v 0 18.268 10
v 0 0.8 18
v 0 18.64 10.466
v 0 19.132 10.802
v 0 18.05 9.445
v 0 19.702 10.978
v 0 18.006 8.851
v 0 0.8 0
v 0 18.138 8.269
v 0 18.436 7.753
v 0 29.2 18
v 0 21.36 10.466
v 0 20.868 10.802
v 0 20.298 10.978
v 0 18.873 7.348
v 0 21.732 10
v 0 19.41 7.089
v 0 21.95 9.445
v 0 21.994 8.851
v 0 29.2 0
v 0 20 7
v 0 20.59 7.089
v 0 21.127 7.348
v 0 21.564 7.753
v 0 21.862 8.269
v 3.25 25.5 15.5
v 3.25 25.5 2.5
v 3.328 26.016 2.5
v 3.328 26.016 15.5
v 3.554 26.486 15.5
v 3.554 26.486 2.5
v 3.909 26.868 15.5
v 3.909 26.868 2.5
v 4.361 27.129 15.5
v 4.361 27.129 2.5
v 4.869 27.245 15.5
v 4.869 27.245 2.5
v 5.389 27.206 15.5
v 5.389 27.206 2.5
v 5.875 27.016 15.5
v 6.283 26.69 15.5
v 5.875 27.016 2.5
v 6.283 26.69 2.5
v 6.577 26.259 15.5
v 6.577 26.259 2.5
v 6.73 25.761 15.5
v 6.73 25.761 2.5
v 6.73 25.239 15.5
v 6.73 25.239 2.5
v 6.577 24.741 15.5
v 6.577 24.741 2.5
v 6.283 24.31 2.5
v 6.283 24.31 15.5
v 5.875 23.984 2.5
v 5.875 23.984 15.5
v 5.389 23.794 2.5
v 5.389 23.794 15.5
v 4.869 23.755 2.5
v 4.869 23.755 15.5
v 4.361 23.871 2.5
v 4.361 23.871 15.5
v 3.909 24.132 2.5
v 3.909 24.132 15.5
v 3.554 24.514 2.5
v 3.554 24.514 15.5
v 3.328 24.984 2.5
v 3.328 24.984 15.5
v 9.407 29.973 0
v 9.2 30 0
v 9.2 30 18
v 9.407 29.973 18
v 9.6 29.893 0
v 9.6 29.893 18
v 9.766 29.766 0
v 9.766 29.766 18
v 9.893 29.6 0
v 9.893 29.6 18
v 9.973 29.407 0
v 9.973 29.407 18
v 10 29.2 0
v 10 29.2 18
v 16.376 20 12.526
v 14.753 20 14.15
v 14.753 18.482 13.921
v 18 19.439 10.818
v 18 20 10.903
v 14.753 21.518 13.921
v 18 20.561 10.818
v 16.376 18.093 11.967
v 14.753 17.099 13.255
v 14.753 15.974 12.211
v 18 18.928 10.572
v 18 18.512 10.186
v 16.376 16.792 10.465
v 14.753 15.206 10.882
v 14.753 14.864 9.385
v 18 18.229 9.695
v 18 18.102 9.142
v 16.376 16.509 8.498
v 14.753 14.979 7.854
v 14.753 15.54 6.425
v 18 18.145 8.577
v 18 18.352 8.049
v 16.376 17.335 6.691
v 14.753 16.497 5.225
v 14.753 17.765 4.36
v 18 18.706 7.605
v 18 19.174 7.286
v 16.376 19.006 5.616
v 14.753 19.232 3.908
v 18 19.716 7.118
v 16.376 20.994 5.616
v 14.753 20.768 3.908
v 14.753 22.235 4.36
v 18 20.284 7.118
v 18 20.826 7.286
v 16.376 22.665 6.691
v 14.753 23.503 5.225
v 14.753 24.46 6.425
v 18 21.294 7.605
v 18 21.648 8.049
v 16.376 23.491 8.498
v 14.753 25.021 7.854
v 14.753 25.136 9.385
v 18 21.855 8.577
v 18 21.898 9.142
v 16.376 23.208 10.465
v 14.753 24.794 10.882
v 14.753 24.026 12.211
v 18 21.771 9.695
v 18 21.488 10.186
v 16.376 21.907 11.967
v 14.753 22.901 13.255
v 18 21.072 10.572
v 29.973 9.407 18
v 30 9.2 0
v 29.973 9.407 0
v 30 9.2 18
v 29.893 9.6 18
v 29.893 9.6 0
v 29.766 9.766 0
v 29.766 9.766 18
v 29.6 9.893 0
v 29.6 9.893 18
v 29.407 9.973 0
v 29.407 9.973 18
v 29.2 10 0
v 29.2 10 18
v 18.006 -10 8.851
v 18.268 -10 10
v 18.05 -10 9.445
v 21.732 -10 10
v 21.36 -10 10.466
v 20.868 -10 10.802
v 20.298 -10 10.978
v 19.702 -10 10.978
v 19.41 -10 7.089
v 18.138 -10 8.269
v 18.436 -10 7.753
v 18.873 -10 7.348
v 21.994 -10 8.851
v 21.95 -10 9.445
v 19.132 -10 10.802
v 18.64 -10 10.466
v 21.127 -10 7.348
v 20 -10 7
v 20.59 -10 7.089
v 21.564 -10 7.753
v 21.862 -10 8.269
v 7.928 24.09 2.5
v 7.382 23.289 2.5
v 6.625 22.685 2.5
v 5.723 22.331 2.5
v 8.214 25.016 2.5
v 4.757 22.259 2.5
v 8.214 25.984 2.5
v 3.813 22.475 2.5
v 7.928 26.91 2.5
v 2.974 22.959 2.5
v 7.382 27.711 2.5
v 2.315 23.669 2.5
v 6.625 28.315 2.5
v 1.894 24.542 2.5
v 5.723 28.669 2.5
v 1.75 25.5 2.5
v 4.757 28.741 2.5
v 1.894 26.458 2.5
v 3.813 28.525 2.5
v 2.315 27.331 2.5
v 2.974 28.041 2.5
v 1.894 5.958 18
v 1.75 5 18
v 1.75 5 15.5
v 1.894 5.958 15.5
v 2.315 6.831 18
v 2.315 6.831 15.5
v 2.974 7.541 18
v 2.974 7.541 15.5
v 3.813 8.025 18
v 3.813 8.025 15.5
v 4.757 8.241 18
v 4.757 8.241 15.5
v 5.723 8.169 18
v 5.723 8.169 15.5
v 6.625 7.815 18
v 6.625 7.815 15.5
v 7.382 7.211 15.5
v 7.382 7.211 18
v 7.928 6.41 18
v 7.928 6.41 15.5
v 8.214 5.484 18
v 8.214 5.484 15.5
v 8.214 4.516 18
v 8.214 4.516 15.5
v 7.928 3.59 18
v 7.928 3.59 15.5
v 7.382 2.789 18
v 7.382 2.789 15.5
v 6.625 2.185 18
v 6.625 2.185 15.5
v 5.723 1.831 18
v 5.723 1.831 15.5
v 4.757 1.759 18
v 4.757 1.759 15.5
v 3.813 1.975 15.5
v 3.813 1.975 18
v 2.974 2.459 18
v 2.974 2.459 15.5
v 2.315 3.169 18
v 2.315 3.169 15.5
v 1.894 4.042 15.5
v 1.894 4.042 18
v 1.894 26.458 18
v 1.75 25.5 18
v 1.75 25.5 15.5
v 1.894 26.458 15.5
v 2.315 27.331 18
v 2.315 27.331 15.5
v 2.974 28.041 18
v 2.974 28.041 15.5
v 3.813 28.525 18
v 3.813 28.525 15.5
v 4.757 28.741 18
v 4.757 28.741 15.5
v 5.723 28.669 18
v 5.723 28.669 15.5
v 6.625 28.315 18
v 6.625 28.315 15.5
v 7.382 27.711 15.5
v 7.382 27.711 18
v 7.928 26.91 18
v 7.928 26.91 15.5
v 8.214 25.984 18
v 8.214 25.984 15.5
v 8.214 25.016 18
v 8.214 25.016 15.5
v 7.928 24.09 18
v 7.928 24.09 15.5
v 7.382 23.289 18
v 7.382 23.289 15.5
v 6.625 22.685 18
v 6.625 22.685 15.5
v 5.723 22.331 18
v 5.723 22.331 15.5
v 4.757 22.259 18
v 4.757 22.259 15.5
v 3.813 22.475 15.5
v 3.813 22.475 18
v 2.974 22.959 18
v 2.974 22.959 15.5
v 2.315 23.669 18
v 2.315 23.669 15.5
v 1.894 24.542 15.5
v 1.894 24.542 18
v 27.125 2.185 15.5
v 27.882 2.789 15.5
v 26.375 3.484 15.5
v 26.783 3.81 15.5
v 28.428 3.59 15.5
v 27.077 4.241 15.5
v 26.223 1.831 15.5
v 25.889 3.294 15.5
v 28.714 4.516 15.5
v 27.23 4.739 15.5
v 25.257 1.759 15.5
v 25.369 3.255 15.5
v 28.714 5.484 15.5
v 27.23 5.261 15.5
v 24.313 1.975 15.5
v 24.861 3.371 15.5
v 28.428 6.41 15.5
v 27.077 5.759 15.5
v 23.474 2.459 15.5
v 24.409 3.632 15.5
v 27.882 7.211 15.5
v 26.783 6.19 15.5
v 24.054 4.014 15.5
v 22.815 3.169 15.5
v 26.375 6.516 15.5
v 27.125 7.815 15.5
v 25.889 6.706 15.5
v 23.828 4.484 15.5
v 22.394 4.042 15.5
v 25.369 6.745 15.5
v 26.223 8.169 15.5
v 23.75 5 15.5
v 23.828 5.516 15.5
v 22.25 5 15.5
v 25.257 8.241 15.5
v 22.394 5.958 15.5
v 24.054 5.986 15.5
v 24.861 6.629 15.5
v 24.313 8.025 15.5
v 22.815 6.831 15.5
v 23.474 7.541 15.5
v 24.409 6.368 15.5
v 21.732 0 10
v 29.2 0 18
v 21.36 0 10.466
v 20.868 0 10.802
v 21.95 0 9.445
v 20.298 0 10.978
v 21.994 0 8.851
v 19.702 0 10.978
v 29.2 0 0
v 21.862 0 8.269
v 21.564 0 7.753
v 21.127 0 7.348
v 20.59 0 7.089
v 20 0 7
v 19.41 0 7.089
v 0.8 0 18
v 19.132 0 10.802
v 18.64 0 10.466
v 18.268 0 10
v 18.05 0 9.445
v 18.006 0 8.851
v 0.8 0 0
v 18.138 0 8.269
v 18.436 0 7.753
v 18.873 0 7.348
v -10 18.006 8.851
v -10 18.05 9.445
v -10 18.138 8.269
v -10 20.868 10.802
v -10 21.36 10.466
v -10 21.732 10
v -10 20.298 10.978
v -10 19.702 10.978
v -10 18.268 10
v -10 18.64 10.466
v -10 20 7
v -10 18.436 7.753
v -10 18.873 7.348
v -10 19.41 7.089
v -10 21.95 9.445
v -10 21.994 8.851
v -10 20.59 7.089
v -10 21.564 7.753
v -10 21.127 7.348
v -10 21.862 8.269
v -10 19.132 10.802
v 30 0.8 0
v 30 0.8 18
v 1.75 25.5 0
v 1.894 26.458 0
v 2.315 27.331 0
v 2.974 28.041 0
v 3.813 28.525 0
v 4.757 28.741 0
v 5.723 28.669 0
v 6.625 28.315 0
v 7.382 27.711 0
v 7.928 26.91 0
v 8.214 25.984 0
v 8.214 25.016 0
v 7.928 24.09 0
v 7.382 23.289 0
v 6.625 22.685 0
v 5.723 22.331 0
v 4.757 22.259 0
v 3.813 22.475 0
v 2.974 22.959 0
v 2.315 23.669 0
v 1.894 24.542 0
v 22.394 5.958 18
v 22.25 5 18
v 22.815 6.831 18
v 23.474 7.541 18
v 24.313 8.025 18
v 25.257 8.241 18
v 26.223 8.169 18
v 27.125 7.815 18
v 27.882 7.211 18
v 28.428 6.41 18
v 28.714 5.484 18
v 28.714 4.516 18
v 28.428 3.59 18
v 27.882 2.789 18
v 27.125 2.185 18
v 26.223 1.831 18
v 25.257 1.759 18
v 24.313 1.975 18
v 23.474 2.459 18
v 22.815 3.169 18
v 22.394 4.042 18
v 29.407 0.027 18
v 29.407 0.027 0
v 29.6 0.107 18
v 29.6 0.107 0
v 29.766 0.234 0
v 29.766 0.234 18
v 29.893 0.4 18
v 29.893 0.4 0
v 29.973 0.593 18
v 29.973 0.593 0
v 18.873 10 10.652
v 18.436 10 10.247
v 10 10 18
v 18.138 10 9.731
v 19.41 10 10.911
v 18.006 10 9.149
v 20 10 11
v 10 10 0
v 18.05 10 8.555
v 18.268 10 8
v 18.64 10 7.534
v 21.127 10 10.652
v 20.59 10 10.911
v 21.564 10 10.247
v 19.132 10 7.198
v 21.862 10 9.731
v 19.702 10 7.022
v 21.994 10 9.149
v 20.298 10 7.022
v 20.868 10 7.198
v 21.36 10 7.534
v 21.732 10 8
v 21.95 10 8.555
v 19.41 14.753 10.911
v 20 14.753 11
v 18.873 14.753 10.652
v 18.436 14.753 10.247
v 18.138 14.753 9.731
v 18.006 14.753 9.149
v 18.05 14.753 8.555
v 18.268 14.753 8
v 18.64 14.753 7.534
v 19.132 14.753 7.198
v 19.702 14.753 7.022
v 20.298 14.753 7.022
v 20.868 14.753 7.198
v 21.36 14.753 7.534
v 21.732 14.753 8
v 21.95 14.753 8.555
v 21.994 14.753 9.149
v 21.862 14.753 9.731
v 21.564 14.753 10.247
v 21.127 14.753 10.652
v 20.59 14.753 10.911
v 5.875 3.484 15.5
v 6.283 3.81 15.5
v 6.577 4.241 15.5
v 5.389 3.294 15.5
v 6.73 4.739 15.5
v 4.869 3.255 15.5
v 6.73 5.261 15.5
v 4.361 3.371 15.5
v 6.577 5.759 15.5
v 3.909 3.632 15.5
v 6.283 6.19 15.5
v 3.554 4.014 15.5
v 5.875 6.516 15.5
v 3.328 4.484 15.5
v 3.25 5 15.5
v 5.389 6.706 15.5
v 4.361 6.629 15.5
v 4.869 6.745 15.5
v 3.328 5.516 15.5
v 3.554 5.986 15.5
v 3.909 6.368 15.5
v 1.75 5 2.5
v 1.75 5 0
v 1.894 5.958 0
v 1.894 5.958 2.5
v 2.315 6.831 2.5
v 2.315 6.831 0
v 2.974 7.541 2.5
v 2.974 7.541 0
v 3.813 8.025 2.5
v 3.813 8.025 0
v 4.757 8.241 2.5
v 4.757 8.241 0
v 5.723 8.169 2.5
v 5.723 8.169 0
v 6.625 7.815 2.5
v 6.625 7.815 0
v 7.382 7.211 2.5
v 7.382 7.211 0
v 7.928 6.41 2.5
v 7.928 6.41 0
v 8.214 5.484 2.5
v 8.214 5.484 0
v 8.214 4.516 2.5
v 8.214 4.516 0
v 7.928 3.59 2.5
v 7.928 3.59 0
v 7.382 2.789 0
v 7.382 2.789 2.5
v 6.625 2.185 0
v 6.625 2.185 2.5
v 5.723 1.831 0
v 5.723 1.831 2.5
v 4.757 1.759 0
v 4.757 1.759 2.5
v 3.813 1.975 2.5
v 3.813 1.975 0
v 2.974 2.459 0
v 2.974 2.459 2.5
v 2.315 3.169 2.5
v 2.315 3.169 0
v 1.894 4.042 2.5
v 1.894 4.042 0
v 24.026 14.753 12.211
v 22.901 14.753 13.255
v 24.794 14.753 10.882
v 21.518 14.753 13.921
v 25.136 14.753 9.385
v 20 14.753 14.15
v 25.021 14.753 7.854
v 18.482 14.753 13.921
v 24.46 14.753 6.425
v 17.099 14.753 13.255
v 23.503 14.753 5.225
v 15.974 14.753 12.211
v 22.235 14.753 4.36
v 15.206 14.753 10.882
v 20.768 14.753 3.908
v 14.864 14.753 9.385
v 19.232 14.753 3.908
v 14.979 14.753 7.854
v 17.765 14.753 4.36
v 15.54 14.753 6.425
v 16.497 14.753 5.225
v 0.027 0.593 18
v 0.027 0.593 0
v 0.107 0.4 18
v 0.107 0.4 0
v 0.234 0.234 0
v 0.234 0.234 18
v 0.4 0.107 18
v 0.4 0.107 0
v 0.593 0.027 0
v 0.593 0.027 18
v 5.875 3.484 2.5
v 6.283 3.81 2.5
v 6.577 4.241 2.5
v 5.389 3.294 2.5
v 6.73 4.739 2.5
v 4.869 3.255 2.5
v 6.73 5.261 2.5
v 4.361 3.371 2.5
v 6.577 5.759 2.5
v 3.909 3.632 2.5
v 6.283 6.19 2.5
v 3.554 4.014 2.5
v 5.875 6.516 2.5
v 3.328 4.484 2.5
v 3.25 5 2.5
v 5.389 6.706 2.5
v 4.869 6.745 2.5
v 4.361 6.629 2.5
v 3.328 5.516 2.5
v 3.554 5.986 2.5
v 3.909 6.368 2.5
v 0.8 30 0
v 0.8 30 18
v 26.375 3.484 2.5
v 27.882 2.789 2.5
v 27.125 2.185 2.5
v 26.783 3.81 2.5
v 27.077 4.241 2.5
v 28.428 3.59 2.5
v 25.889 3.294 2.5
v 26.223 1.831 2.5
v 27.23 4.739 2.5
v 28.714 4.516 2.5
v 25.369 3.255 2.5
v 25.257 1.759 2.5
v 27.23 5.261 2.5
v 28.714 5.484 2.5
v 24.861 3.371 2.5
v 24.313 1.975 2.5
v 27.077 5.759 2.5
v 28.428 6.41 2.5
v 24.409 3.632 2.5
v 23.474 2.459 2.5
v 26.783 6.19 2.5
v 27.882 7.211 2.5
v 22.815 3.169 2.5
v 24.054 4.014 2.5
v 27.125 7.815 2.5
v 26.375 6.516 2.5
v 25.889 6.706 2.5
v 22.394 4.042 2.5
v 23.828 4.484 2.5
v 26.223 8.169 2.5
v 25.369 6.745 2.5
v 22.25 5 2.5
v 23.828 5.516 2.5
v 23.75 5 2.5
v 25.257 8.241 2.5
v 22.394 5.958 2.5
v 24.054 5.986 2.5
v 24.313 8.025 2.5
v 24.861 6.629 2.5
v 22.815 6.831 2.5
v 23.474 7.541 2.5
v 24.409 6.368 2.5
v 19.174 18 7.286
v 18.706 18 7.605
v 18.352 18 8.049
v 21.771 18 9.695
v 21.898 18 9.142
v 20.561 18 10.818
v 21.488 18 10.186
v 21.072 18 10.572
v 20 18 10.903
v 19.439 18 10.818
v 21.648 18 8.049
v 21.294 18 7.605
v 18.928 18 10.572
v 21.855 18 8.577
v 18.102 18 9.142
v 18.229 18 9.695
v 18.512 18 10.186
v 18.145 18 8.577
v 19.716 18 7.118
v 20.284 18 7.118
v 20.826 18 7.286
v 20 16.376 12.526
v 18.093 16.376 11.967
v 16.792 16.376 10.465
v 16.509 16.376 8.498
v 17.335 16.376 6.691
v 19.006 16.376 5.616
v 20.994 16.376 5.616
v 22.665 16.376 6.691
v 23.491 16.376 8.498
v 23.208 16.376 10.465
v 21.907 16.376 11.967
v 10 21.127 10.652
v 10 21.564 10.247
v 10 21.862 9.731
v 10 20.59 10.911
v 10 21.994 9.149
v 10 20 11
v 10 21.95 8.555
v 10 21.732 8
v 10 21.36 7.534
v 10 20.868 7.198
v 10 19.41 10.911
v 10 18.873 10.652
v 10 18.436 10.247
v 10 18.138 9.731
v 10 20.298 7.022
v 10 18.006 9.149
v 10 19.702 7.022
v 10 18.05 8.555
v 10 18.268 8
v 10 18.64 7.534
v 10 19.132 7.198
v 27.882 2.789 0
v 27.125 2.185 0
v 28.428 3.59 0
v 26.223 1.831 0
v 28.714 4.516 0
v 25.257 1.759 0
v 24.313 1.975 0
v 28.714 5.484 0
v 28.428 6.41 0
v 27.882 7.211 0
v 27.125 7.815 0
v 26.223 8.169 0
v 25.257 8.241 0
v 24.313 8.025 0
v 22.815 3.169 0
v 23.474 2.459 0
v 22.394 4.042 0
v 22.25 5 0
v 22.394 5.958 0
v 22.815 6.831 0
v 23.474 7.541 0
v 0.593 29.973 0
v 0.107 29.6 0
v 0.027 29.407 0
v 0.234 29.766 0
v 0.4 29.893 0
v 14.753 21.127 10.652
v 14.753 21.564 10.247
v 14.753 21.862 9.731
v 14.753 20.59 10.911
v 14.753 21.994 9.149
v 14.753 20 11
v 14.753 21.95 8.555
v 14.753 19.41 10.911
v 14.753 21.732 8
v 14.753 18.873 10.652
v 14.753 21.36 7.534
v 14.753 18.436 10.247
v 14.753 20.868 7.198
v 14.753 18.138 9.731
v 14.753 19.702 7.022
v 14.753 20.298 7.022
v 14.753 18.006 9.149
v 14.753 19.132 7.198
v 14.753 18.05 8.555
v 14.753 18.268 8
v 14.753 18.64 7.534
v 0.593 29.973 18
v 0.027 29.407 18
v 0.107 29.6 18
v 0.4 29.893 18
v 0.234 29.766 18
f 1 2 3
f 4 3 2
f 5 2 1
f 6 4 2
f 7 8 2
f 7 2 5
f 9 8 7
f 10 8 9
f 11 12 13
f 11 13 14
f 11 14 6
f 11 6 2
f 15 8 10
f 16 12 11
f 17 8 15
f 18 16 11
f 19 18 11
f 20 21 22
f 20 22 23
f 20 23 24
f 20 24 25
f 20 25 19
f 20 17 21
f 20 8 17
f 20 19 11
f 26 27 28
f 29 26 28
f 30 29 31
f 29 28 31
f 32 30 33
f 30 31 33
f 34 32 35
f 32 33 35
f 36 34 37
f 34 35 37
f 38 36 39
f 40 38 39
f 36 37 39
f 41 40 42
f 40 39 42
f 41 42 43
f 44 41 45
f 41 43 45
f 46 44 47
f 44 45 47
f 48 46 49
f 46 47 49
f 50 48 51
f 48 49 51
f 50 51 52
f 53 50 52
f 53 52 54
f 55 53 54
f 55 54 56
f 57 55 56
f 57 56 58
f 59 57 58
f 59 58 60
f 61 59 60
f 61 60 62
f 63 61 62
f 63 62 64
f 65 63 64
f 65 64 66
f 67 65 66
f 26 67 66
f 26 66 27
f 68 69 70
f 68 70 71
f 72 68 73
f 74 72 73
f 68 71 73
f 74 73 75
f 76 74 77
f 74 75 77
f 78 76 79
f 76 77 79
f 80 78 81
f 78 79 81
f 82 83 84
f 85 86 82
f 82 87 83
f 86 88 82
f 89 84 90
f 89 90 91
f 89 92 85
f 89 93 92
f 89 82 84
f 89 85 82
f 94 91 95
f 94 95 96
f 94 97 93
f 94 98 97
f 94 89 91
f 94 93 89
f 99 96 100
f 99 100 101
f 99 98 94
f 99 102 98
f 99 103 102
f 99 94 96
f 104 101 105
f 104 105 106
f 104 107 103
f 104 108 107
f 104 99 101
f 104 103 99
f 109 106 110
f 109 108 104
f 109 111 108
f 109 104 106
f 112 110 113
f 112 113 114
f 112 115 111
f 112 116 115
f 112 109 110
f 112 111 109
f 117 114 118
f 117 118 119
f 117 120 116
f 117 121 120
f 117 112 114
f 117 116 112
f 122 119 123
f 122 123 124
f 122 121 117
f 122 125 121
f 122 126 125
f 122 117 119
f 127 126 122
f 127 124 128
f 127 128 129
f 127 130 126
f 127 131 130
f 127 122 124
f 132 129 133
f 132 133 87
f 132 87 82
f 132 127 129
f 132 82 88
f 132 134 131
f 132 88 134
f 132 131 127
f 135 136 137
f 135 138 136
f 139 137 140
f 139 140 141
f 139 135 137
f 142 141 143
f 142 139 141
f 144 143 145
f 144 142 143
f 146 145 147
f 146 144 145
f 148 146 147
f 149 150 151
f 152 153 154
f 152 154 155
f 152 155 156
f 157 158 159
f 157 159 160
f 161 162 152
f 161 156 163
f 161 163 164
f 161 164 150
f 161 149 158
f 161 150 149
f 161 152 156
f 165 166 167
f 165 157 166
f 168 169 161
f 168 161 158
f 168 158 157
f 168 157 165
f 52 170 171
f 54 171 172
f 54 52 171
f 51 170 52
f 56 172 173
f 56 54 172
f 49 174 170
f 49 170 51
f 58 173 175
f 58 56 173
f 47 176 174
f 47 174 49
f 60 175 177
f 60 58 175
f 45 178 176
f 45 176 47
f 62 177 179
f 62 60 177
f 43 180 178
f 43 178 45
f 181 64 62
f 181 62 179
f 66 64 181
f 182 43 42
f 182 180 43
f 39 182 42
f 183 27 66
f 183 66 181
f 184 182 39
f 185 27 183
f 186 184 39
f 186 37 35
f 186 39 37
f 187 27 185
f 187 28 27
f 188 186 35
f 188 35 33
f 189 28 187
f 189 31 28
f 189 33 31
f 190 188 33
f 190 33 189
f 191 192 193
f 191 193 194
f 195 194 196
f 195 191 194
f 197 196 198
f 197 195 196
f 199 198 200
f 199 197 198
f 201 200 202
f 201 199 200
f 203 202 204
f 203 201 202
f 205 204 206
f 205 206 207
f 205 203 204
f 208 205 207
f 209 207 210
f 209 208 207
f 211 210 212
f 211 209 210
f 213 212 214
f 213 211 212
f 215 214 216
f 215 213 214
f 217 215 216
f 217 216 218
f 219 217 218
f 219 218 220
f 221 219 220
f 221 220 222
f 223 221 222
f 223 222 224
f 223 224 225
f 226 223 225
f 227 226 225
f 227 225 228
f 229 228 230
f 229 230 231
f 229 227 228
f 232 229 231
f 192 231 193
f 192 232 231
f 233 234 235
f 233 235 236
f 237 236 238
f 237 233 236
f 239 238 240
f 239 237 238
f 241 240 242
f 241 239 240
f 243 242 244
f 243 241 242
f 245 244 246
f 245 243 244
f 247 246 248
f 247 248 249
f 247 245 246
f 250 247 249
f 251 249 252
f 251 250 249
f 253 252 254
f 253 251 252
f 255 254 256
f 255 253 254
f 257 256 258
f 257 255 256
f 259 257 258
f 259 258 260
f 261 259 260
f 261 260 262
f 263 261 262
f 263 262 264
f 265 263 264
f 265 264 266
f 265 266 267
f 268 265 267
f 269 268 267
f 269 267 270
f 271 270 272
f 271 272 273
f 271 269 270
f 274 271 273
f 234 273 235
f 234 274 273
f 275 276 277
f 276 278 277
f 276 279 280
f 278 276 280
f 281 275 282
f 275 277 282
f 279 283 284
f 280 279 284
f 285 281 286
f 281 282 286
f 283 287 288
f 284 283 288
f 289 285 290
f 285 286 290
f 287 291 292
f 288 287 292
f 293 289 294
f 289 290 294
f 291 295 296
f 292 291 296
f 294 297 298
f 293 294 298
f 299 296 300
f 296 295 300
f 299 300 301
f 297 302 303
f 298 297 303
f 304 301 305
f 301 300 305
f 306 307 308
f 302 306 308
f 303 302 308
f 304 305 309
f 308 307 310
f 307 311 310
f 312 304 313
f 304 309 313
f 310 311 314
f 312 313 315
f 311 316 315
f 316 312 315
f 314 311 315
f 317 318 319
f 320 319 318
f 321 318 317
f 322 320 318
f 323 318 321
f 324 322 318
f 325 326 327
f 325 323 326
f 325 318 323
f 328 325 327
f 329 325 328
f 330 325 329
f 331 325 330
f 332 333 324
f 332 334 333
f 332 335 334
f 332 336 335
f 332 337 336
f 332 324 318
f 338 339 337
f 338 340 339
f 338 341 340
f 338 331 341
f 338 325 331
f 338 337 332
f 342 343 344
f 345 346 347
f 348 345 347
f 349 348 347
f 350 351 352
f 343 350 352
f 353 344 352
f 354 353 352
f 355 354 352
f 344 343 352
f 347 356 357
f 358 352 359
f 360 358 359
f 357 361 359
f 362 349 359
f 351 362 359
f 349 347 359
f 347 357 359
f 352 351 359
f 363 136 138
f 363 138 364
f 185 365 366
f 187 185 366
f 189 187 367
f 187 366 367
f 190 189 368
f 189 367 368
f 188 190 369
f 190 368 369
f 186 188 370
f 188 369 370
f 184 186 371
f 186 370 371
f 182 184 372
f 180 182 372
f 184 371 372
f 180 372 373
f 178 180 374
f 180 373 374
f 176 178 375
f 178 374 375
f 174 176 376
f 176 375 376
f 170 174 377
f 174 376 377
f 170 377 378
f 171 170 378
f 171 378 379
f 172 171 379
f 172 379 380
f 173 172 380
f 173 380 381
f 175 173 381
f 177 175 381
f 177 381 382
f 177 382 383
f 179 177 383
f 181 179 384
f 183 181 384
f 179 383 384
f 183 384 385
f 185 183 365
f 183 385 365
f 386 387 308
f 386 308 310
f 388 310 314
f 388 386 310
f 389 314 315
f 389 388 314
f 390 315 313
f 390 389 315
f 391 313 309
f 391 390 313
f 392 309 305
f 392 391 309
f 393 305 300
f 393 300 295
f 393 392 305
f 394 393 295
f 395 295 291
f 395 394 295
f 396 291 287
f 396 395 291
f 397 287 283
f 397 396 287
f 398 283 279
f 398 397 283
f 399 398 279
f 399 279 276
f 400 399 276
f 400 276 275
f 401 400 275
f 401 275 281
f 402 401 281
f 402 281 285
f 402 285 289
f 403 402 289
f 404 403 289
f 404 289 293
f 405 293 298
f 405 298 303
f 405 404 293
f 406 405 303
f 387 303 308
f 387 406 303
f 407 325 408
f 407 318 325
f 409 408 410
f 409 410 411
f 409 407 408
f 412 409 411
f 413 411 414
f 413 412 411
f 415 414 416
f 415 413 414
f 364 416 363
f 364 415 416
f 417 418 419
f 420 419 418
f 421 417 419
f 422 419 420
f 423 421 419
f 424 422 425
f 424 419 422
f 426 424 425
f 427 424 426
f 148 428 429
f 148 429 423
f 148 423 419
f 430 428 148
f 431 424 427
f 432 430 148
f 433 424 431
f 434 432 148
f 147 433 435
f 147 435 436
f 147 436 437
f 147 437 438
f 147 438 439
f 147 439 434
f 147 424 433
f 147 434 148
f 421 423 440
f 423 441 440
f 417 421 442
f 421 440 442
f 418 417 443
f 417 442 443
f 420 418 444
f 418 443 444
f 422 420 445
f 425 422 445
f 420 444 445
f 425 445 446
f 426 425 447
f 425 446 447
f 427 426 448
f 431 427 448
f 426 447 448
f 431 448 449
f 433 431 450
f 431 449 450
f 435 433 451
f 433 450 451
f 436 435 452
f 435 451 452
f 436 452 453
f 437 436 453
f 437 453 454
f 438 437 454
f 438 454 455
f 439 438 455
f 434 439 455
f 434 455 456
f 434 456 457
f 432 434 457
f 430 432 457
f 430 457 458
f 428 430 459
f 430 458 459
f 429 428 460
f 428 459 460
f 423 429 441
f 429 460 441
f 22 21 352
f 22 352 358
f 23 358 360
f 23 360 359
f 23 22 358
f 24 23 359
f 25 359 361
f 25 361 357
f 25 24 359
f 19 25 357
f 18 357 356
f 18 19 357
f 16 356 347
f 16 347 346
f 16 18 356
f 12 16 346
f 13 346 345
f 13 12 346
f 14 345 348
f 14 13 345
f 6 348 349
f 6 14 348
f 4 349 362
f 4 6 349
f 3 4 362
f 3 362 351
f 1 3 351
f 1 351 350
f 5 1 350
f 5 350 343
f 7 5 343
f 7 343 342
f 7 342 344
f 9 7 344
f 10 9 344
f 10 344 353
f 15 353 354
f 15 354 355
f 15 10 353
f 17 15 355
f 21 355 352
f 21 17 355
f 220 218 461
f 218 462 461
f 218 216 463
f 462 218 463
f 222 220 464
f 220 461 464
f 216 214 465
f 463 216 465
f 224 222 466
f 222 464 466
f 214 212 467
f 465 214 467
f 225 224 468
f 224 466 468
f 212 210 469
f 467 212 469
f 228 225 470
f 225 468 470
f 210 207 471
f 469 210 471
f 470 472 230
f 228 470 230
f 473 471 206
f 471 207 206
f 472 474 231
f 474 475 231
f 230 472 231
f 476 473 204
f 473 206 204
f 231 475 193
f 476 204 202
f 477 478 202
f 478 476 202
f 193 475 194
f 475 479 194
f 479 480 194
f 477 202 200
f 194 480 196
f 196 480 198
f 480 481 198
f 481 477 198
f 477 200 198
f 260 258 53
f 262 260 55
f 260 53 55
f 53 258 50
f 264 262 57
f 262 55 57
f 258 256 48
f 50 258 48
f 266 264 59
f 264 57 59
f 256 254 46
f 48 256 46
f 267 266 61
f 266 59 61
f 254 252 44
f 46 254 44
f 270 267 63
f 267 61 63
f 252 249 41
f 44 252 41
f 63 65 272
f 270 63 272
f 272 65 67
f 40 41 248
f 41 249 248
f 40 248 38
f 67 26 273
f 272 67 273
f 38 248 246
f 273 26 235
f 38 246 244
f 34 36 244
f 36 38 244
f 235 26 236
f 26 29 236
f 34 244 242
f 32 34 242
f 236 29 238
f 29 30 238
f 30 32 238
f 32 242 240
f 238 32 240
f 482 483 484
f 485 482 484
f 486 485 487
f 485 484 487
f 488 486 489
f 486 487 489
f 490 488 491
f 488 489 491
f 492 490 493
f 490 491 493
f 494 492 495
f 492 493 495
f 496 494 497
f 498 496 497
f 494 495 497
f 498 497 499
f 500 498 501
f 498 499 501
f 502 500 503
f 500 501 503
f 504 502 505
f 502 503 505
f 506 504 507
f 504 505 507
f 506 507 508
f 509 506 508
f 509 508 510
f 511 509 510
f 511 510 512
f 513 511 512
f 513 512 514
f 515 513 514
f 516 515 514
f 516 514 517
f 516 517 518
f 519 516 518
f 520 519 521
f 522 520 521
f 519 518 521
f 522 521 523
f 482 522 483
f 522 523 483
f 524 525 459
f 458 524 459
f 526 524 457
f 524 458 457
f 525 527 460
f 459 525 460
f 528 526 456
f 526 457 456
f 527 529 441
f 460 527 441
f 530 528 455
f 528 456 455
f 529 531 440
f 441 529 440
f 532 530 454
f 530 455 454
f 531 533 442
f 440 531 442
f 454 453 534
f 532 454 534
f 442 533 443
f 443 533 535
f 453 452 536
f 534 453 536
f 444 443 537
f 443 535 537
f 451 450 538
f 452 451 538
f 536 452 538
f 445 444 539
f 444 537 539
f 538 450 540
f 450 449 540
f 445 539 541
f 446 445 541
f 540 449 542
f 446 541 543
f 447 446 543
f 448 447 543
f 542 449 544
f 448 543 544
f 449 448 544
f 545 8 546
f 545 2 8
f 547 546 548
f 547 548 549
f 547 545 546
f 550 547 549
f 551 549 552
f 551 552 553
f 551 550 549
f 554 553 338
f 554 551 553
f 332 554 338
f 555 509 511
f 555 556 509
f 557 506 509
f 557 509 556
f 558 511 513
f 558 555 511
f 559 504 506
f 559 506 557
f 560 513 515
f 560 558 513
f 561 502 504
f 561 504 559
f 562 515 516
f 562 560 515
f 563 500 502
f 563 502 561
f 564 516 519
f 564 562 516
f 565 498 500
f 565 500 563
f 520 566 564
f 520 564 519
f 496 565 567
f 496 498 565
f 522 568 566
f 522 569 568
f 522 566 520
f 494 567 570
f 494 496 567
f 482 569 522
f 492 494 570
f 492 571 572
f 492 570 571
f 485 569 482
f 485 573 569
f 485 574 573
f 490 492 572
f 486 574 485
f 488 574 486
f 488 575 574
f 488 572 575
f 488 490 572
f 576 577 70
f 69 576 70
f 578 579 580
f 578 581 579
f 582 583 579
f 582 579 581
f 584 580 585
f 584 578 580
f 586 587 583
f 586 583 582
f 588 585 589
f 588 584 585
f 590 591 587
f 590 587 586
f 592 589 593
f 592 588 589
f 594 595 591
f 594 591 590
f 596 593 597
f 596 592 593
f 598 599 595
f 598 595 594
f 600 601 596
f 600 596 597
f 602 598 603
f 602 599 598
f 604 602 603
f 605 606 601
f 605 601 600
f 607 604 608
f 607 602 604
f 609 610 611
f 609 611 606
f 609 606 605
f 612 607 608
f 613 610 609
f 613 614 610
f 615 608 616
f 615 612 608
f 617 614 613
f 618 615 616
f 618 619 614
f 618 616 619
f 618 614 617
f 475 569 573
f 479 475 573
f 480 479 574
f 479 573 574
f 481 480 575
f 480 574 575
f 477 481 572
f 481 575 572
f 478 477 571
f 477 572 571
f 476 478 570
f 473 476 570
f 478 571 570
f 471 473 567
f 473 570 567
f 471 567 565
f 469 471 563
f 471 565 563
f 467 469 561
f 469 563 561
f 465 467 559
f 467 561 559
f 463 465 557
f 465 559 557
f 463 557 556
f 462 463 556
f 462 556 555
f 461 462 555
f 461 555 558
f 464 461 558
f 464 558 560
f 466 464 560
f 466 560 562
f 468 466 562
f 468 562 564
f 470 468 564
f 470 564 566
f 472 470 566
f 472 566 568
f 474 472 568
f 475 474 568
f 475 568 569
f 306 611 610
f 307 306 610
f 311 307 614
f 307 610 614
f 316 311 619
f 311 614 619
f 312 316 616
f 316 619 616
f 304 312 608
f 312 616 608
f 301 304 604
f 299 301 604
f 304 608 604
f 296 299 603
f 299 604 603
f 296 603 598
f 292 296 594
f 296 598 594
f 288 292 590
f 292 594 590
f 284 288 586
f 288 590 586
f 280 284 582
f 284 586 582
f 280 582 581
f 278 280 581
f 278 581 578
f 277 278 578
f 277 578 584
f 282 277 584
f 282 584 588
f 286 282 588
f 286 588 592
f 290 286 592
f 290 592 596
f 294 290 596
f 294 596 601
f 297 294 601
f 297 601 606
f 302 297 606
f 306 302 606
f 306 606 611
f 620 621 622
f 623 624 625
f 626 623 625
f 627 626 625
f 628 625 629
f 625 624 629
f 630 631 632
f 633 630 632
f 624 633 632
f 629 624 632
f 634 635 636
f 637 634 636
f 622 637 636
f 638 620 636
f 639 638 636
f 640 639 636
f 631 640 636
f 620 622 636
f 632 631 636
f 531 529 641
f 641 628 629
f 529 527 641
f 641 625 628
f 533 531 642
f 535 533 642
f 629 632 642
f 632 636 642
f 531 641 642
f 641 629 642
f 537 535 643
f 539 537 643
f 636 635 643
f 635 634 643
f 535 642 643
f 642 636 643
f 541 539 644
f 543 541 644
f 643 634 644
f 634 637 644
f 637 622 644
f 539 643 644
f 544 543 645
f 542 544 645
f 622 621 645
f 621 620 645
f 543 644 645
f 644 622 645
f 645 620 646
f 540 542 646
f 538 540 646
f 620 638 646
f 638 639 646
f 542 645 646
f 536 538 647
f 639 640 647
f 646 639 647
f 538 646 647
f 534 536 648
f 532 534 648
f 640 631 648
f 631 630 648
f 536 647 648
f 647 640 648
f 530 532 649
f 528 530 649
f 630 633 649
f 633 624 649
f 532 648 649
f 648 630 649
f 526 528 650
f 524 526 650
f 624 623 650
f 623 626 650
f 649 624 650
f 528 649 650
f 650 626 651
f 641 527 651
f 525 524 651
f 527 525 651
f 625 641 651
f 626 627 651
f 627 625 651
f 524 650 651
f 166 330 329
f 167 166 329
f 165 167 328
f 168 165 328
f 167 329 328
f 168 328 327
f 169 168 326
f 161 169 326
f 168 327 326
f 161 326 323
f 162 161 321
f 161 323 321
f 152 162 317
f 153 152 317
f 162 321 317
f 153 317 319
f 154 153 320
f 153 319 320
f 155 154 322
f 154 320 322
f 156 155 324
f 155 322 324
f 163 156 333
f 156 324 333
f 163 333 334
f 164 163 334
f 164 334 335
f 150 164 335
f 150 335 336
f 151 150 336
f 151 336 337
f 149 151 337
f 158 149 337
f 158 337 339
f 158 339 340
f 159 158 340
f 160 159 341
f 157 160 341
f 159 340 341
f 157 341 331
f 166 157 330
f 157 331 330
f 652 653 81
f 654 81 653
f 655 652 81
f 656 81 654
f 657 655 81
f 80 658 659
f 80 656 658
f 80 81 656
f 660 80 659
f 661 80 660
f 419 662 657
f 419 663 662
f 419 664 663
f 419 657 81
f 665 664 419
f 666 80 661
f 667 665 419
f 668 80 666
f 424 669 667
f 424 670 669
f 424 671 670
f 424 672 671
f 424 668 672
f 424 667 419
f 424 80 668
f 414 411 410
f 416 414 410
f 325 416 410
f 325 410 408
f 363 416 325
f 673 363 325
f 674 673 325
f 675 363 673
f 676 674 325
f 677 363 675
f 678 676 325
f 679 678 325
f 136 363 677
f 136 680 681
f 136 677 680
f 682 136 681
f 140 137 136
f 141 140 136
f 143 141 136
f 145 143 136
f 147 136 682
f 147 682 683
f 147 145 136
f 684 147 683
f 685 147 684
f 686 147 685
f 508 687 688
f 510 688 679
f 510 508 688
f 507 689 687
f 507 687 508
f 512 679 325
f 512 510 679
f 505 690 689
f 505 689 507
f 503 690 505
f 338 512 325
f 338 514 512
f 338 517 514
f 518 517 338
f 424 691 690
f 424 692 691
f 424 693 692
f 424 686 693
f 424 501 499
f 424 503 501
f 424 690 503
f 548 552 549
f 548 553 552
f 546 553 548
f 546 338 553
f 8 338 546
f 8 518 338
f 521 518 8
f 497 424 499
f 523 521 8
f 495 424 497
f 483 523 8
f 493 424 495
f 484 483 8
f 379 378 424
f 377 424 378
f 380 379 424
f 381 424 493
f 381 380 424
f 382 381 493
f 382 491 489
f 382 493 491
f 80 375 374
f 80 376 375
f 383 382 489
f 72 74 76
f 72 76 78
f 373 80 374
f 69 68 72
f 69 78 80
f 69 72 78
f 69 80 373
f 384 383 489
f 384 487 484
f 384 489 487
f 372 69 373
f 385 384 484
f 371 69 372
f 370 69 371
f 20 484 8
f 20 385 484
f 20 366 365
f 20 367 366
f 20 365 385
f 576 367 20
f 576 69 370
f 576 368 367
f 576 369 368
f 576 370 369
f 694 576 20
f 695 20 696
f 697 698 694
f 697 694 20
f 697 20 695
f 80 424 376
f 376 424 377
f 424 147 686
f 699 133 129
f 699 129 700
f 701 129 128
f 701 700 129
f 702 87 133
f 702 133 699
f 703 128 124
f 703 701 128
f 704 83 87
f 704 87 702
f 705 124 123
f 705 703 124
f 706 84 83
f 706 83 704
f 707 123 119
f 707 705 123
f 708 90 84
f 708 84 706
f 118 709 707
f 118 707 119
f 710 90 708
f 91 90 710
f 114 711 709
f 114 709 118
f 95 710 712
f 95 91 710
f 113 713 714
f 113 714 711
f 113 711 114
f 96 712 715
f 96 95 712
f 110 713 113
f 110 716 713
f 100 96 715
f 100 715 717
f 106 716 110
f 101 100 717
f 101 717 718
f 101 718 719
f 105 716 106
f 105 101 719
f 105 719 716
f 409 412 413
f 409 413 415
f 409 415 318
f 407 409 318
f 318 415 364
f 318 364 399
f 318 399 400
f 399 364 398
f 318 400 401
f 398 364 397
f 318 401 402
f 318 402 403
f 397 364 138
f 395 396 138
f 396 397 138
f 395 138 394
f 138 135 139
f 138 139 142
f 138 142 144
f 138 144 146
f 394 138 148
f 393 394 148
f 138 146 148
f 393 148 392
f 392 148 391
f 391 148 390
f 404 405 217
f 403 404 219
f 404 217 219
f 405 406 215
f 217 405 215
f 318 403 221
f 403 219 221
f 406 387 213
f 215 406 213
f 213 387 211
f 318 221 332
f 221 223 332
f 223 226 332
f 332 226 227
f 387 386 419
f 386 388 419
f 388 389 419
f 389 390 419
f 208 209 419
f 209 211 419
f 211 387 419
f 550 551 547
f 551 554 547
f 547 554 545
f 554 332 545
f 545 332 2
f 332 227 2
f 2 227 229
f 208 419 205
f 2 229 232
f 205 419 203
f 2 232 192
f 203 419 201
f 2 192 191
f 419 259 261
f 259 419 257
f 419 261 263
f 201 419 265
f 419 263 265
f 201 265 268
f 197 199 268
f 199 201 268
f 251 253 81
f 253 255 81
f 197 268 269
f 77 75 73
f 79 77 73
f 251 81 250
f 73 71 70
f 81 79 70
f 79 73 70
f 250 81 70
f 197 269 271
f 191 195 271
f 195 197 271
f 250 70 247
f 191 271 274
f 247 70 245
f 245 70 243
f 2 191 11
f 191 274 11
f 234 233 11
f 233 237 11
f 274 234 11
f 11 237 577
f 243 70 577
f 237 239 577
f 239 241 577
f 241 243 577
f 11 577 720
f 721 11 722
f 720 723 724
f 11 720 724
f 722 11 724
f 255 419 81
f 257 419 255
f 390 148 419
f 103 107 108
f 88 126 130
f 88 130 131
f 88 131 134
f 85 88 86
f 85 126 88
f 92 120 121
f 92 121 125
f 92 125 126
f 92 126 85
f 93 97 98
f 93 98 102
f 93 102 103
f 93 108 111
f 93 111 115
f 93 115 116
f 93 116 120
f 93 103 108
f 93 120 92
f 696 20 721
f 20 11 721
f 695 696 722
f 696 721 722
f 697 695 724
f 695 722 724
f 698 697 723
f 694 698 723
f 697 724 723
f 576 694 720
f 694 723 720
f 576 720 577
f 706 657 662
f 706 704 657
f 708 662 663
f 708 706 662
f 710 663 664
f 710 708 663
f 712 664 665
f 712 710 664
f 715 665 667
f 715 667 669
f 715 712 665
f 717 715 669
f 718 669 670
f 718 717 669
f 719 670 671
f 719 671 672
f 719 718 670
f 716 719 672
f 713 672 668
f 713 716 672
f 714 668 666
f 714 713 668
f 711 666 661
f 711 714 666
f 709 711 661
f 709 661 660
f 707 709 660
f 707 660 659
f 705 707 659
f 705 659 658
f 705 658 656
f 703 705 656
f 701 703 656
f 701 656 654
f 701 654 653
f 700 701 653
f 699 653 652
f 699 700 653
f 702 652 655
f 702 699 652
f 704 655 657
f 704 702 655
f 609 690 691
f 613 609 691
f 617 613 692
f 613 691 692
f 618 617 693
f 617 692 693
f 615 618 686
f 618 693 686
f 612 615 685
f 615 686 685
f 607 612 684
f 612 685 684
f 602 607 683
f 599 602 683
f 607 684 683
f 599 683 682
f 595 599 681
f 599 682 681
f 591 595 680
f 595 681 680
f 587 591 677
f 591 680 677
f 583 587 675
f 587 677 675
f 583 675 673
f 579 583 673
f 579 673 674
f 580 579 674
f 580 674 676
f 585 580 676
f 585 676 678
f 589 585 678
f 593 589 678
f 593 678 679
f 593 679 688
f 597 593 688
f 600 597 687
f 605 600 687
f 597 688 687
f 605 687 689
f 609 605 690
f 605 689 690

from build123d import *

# Parameters (mm, degrees)
BOSS_EXTRUDE2_DEPTH = 18
SKETCH2_R           = 1.75
CUT_EXTRUDE1_DEPTH  = 18
SKETCH3_R           = 3.25
CUT_EXTRUDE2_DEPTH  = 2.5
FILLET1_R           = 0.8
SKETCH4_R           = 2
BOSS_EXTRUDE3_DEPTH = 10


with BuildPart() as part:
    # Sketch1 → Boss-Extrude2 (new body)
    with BuildSketch(Plane.XY):
        Polygon((0, 0), (0, 30), (10, 30), (10, 10), (30, 10), (30, 0), align=None)
    extrude(amount=BOSS_EXTRUDE2_DEPTH)

    # Sketch2 → Cut-Extrude1 (cut)
    with BuildSketch(Plane(origin=(0, 0, 0), x_dir=(-1, 0, 0), z_dir=(0, 0, -1))):
        with Locations((-25.5, 5)):
            Circle(SKETCH2_R)
        with Locations((-5, 5)):
            Circle(SKETCH2_R)
        with Locations((-5, 25.5)):
            Circle(SKETCH2_R)
    extrude(amount=-CUT_EXTRUDE1_DEPTH, mode=Mode.SUBTRACT)

    # Sketch3 → Cut-Extrude2 (cut)
    with BuildSketch(Plane(origin=(0, 0, 0), x_dir=(-1, 0, 0), z_dir=(0, 0, -1))):
        with Locations((-25.5, 5)):
            Circle(SKETCH3_R)
        with Locations((-5, 5)):
            Circle(SKETCH3_R)
        with Locations((-5, 25.5)):
            Circle(SKETCH3_R)
    cut_extrude2 = extrude(amount=-CUT_EXTRUDE2_DEPTH, mode=Mode.SUBTRACT)

    # Mirror1: Cut-Extrude2 across plane
    add(cut_extrude2.mirror(Plane.XY.offset(9)), mode=Mode.SUBTRACT)

    # Fillet1
    fillet1_edges = [part.edges().sort_by_distance(p)[0] for p in [
        (10, 30, 9),
        (0, 30, 9),
        (0, 0, 9),
        (30, 0, 9),
        (30, 10, 9),
    ]]
    fillet(fillet1_edges, radius=FILLET1_R)

    # Sketch4 → Boss-Extrude3 (add)
    with BuildSketch(Plane.XZ):
        with Locations(Location((20, 9, 0), (0, 0, 270))):
            Circle(SKETCH4_R)
    boss_extrude3 = extrude(amount=BOSS_EXTRUDE3_DEPTH)

    # Mirror2: Boss-Extrude3 across plane
    add(boss_extrude3.mirror(Plane(origin=(0, 0, 0), x_dir=(0, 0, 1), z_dir=(0.7071067811865438, -0.7071067811865512, 0))))

    # Sketch5 → Revolve4 (revolve)
    with BuildSketch(Plane.XY.offset(9), mode=Mode.PRIVATE) as revolve4_sk:
        Polygon((18, 10), (18, 14.752860349), (14.85, 14.752860349), (18.097139651, 18), (20, 18), (20, 10), align=None)
    revolve4 = revolve(revolve4_sk.sketch.rotate(Axis((20, 23.873341049, 9), (0, -1, 0)), 270), axis=Axis((20, 23.873341049, 9), (0, -1, 0)))

    # Mirror7: Revolve4 across plane
    add(revolve4.mirror(Plane(origin=(0, 0, 0), x_dir=(0, 0, 1), z_dir=(0.7071067811865438, -0.7071067811865512, 0))))


solid = part.part
